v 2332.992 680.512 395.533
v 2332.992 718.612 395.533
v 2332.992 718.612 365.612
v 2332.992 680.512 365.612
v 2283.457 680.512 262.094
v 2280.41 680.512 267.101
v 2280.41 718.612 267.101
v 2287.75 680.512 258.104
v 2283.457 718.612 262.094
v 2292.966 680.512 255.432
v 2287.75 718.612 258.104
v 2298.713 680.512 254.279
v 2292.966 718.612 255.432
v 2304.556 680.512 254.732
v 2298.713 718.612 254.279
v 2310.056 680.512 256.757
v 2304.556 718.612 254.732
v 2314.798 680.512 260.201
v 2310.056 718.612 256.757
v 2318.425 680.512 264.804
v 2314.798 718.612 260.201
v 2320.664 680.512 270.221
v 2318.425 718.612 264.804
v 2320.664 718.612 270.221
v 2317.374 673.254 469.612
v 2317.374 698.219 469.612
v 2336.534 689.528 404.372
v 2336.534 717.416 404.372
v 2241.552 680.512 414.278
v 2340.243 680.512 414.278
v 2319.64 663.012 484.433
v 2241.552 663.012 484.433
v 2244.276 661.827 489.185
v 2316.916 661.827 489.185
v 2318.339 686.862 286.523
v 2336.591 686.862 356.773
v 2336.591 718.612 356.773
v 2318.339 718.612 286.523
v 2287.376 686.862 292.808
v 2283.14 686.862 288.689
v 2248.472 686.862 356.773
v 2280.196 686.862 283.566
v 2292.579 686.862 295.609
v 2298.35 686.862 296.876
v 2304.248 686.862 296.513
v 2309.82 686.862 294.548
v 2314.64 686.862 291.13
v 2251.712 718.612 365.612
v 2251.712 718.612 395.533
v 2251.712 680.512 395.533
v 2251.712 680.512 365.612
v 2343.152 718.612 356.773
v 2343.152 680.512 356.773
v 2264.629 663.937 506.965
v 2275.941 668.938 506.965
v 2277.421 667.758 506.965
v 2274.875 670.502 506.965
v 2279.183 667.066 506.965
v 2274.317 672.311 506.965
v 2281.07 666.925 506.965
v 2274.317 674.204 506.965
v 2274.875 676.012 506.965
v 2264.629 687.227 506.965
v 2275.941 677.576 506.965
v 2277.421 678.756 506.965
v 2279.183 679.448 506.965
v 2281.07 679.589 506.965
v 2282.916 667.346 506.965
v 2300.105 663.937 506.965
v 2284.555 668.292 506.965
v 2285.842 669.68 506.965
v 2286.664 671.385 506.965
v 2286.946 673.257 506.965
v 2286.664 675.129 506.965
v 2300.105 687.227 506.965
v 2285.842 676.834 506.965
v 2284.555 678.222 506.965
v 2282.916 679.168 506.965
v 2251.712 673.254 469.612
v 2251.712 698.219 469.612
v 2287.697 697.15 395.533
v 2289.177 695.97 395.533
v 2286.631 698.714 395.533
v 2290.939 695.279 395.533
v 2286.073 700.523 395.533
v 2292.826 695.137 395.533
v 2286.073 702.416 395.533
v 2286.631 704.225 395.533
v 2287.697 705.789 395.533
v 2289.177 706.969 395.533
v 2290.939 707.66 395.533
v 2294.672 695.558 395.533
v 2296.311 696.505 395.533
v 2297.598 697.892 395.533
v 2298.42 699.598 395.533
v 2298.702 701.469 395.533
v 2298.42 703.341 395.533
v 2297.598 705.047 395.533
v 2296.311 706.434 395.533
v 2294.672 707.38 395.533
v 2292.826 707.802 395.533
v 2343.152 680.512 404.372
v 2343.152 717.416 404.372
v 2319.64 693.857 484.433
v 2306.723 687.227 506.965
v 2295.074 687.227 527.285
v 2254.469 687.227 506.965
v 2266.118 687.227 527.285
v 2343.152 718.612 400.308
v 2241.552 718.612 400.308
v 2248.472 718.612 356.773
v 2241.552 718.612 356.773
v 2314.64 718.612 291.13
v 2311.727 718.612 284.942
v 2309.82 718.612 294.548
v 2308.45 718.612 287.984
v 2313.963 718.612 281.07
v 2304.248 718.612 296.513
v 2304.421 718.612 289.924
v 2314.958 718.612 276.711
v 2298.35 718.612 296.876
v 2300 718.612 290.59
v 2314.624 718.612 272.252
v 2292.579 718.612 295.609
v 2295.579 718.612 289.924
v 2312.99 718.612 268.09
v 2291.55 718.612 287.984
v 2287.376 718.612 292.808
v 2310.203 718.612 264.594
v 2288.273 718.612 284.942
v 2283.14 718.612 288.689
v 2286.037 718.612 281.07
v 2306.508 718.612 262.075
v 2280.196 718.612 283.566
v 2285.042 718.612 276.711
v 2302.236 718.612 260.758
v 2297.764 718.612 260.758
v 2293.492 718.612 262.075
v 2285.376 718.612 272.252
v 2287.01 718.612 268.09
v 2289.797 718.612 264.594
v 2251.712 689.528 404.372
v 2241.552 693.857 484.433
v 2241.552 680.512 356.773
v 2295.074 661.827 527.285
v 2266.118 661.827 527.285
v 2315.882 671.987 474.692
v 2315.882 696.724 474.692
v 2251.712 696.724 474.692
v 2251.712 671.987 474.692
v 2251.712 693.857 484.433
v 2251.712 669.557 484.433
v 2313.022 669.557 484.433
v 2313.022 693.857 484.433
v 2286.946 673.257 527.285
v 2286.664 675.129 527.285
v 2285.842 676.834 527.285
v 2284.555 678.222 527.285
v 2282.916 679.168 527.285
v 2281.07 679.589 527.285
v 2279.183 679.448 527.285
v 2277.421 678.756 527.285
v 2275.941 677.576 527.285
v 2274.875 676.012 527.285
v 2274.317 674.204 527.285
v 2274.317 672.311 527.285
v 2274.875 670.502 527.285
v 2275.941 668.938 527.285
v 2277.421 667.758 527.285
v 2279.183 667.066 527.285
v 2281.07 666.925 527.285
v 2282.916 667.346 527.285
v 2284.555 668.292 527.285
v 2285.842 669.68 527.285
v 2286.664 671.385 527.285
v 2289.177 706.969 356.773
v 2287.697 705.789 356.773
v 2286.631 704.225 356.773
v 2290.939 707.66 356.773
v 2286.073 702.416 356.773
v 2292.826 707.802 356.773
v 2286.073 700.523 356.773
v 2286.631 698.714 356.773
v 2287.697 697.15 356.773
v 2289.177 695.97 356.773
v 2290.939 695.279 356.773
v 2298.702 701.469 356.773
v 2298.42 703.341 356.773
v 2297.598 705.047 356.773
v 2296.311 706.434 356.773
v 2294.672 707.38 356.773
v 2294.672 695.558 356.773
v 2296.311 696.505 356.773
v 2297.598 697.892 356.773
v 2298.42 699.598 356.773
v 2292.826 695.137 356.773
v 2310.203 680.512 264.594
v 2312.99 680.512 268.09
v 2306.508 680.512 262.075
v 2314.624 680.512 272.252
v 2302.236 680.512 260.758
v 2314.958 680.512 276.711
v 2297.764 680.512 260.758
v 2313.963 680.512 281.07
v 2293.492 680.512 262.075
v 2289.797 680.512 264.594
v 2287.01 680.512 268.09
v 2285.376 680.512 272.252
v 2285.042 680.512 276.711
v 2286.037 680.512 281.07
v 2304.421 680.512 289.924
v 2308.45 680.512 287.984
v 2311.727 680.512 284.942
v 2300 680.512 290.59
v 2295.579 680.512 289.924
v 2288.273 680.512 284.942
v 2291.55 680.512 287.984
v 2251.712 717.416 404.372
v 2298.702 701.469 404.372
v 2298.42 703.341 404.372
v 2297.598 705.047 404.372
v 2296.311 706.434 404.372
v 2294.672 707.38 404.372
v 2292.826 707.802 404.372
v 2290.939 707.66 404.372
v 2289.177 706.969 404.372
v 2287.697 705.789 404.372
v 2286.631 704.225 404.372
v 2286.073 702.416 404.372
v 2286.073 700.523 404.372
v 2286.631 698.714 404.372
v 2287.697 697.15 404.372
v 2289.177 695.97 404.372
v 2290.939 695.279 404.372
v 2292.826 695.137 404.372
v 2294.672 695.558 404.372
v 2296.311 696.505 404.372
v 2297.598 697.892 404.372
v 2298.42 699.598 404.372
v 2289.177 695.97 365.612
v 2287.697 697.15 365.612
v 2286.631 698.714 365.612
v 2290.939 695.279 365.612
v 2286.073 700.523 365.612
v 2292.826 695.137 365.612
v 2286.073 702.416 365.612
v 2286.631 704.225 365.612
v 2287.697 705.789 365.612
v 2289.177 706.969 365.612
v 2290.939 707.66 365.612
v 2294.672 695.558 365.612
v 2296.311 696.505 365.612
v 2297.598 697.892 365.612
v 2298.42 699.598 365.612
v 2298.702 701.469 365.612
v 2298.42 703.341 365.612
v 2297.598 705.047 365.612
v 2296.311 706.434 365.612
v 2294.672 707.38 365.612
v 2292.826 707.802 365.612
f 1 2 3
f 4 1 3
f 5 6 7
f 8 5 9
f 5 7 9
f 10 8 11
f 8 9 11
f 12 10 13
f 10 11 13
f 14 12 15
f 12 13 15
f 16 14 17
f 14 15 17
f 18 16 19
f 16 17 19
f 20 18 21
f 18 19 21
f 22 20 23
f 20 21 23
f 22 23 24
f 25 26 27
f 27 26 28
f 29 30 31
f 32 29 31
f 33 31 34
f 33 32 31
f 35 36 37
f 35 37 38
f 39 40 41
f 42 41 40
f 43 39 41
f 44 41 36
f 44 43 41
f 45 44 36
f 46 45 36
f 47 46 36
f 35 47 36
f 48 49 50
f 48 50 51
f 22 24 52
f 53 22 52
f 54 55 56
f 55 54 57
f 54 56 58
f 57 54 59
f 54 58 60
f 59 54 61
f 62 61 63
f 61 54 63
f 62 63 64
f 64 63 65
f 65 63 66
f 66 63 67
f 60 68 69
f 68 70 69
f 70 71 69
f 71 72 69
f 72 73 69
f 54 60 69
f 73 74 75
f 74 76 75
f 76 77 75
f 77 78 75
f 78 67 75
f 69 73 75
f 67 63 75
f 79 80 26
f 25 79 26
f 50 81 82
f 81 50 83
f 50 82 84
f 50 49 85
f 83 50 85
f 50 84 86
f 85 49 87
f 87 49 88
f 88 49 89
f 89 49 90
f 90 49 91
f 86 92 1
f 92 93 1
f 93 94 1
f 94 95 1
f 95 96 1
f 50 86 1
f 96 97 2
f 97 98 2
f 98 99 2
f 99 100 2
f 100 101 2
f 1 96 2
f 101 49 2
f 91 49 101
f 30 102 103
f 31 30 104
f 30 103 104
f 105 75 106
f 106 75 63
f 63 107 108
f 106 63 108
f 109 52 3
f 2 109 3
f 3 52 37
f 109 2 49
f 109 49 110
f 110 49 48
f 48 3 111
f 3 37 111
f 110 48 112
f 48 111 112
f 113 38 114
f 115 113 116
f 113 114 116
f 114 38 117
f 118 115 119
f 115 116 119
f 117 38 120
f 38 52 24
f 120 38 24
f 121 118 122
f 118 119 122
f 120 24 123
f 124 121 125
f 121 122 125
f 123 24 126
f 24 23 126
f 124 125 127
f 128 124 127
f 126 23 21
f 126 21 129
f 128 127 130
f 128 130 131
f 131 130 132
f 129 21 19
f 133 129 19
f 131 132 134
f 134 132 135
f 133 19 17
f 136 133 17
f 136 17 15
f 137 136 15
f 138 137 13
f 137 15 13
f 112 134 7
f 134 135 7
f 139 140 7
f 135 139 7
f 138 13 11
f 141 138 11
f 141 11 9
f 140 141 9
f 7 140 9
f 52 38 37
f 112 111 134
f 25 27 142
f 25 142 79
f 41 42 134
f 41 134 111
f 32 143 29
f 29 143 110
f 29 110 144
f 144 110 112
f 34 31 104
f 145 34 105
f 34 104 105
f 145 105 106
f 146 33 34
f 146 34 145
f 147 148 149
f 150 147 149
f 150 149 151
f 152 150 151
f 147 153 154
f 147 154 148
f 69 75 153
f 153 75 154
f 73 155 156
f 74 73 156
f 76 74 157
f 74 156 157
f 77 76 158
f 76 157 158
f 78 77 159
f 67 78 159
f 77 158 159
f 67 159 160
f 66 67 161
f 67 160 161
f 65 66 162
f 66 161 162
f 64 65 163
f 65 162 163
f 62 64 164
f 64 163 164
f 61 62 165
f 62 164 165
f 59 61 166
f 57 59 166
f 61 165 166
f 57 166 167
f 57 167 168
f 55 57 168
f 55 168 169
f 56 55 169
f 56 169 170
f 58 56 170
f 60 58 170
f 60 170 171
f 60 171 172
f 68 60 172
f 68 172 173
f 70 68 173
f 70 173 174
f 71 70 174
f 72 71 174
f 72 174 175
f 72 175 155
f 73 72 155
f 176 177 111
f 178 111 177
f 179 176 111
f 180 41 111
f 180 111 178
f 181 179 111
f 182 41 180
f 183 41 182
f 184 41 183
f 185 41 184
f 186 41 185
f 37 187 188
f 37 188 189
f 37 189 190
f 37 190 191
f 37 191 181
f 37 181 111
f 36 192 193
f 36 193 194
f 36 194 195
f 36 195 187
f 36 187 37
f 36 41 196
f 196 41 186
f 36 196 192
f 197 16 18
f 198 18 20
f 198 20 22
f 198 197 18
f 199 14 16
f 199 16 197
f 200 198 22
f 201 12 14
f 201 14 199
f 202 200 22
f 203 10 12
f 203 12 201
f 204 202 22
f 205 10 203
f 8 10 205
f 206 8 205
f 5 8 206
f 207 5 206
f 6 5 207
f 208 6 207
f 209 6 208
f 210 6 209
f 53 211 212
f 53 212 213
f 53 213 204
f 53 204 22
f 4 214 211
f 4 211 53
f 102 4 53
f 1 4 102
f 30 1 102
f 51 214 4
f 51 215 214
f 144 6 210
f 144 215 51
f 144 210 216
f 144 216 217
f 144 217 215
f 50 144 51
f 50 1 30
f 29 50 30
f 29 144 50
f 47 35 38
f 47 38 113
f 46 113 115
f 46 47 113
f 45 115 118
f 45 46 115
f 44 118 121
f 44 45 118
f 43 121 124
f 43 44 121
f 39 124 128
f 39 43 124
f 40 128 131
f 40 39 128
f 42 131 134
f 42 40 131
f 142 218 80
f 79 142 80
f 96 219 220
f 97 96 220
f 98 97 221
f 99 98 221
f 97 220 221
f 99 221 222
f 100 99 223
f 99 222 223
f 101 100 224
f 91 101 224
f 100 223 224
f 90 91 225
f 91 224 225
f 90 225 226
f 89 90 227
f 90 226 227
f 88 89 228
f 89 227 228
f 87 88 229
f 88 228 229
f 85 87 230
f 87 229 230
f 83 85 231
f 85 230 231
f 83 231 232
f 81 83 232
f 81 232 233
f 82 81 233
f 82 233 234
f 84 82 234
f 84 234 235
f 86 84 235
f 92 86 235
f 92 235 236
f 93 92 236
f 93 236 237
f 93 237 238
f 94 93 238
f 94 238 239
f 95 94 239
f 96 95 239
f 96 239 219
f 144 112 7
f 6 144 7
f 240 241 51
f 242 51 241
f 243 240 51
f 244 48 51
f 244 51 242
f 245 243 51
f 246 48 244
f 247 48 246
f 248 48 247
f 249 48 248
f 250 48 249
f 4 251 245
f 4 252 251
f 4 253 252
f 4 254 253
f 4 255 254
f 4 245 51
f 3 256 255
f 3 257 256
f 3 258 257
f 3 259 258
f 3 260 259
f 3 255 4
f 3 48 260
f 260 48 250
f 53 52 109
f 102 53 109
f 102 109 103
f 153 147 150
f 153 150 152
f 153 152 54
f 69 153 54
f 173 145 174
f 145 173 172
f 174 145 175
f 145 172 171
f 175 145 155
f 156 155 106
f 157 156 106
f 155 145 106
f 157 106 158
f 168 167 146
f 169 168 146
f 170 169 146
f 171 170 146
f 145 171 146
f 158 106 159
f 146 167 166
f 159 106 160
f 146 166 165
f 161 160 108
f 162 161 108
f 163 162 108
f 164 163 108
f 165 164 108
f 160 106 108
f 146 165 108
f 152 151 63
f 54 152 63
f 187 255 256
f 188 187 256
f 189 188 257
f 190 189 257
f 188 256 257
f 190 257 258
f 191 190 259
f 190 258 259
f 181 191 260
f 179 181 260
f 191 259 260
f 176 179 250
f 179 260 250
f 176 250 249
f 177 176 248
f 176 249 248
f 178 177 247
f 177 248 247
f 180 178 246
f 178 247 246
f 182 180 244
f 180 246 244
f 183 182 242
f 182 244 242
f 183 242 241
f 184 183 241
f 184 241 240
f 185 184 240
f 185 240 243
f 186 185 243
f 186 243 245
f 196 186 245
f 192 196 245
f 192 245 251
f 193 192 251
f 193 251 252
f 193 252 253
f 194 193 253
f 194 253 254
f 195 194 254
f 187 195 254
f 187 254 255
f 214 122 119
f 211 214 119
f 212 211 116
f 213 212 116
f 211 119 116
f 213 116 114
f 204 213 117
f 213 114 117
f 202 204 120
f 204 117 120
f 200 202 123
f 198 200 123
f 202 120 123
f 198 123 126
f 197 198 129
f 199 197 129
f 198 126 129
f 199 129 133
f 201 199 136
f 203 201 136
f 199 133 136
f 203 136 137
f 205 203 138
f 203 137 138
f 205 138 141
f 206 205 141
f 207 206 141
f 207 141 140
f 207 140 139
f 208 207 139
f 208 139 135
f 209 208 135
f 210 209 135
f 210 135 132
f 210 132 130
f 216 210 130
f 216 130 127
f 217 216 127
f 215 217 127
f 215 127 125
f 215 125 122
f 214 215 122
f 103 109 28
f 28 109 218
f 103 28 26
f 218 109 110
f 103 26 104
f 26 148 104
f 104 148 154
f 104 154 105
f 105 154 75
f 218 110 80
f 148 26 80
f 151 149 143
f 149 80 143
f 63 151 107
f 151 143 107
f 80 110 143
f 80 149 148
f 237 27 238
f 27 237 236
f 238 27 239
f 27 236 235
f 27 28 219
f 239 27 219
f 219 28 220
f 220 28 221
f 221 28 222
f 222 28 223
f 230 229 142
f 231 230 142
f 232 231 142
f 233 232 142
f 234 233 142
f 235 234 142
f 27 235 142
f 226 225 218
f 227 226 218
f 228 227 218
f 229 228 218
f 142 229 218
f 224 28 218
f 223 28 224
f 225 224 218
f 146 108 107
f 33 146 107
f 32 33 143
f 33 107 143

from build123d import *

# Parameters (mm, degrees)
SKETCH1_R                      = 15
SKETCH1_W                      = 81.28
SKETCH1_H                      = 29.9212
BOSS_EXTRUDE1_DEPTH            = 88.9
CUT_EXTRUDE1_DEPTH             = 894.223960082
CUT_EXTRUDE1_DEPTH_BACK        = 894.223960082
CUT_EXTRUDE2_REACH             = 2404.418
CUT_EXTRUDE2_DIRECTION_2_DEPTH = 2403.418387278
CUT_EXTRUDE3_DEPTH             = 2403.418387278
CUT_EXTRUDE3_DEPTH_BACK        = 31.75
SKETCH6_R                      = 6.35
CUT_EXTRUDE4_DEPTH             = 31.75
SKETCH7_R                      = 6.35
CUT_EXTRUDE5_DEPTH             = 50.8


with BuildPart() as part:
    # Sketch1 → Boss-Extrude1 (new body)
    with BuildSketch(Plane(origin=(0, 718.612000035, 0), x_dir=(1, 0, 0), z_dir=(0, 1, 0))):
        with BuildLine():
            Line((2295.073740346, -527.28515435), (2266.117740346, -527.28515435))
            Line((2266.117740346, -527.28515435), (2241.551712769, -484.433115091))
            Line((2241.551712769, -484.433115091), (2241.551712769, -356.772715091))
            Line((2241.551712769, -356.772715091), (2280.410248463, -267.100940225))
            ThreePointArc((2280.410248463, -267.100940225), (2301.649946984, -254.303850194), (2320.663918503, -270.221111063))
            Line((2320.663918503, -270.221111063), (2343.151712769, -356.772715091))
            Line((2343.151712769, -356.772715091), (2343.151712769, -404.372315091))
            Line((2343.151712769, -404.372315091), (2319.639767922, -484.433115091))
            Line((2319.639767922, -484.433115091), (2295.073740346, -527.28515435))
        make_face()
        with Locations(Location((2299.99999994, -275.59, 0), (0, 0, 270))):
            Circle(SKETCH1_R, mode=Mode.SUBTRACT)
        with Locations((2292.351712769, -380.572515091)):
            Rectangle(SKETCH1_W, SKETCH1_H, mode=Mode.SUBTRACT)
    extrude(amount=-BOSS_EXTRUDE1_DEPTH)

    # Sketch3 → Cut-Extrude1 (cut, two sides: drawn at the far end of the back side and taken through both)
    with BuildSketch(Plane(origin=(2299.99999994, 0, 0), x_dir=(0, 0, -1), z_dir=(1, 0, 0)).offset(-CUT_EXTRUDE1_DEPTH_BACK)):
        Polygon((-254.240000028, 680.512000035), (-414.278315091, 680.512000035), (-489.18515435, 661.827103465), (-527.28515435, 661.827103465), (-527.28515435, 629.712000035), (-254.240000028, 629.712000035), align=None)
        Polygon((-527.28515435, 687.227103465), (-527.28515435, 718.612000035), (-400.308315091, 718.612000035), (-506.96515435, 687.227103465), align=None)
    extrude(amount=CUT_EXTRUDE1_DEPTH + CUT_EXTRUDE1_DEPTH_BACK, mode=Mode.SUBTRACT)

    # Cut-Extrude2: up to this plane
    cut_extrude2_end = Plane(origin=(2241.551712769, 686.673213286, 415.815179194), z_dir=(0, 0.9702698033545601, 0.24202584303810049))
    # Sketch4 → Cut-Extrude2 (cut, up to the surface)
    with BuildSketch(Plane(origin=(0, 718.612000035, 0), x_dir=(1, 0, 0), z_dir=(0, 1, 0)), mode=Mode.PRIVATE) as cut_extrude2_sk1:
        Polygon((2317.374261561, -469.611817535), (2336.533545297, -404.372315091), (2251.711712769, -404.372315091), (2251.711712769, -469.611817535), align=None)
    cut_extrude2_tool1 = split(extrude(cut_extrude2_sk1.sketch, amount=-CUT_EXTRUDE2_REACH, mode=Mode.PRIVATE), bisect_by=cut_extrude2_end, keep=Keep.BOTH, mode=Mode.PRIVATE)
    add(cut_extrude2_tool1.solids().sort_by_distance((2289.536084, 718.612, 435.607712))[0], mode=Mode.SUBTRACT)
    # Sketch4 → Cut-Extrude2 (cut, up to the surface)
    with BuildSketch(Plane(origin=(0, 718.612000035, 0), x_dir=(1, 0, 0), z_dir=(0, 1, 0)), mode=Mode.PRIVATE) as cut_extrude2_sk2:
        Polygon((2313.02160045, -484.433115091), (2315.882386888, -474.691817535), (2251.711712769, -474.691817535), (2251.711712769, -484.433115091), (2264.6287806, -506.96515435), (2300.104532619, -506.96515435), align=None)
    cut_extrude2_tool2 = split(extrude(cut_extrude2_sk2.sketch, amount=-CUT_EXTRUDE2_REACH, mode=Mode.PRIVATE), bisect_by=cut_extrude2_end, keep=Keep.BOTH, mode=Mode.PRIVATE)
    add(cut_extrude2_tool2.solids().sort_by_distance((2282.625495, 718.612, 489.24748))[0], mode=Mode.SUBTRACT)

    # Sketch4 → Cut-Extrude2 direction 2 (cut)
    with BuildSketch(Plane(origin=(0, 718.612000035, 0), x_dir=(1, 0, 0), z_dir=(0, 1, 0))):
        Polygon((2317.374261561, -469.611817535), (2336.533545297, -404.372315091), (2251.711712769, -404.372315091), (2251.711712769, -469.611817535), align=None)
        Polygon((2313.02160045, -484.433115091), (2315.882386888, -474.691817535), (2251.711712769, -474.691817535), (2251.711712769, -484.433115091), (2264.6287806, -506.96515435), (2300.104532619, -506.96515435), align=None)
    extrude(amount=CUT_EXTRUDE2_DIRECTION_2_DEPTH, mode=Mode.SUBTRACT)

    # Sketch5 → Cut-Extrude3 (cut, two sides: drawn at the far end of the back side and taken through both)
    with BuildSketch(Plane(origin=(0, 718.612000035, 0), x_dir=(1, 0, 0), z_dir=(0, 1, 0)).offset(-CUT_EXTRUDE3_DEPTH_BACK)):
        with BuildLine():
            Line((2336.590880718, -356.772715091), (2318.338523091, -286.522569115))
            ThreePointArc((2318.338523091, -286.522569115), (2298.350052896, -296.876149806), (2280.195820512, -283.566025074))
            Line((2280.195820512, -283.566025074), (2248.472295676, -356.772715091))
            Line((2248.472295676, -356.772715091), (2336.590880718, -356.772715091))
        make_face()
    extrude(amount=CUT_EXTRUDE3_DEPTH + CUT_EXTRUDE3_DEPTH_BACK, mode=Mode.SUBTRACT)

    # Sketch6 → Cut-Extrude4 (cut)
    with BuildSketch(Plane.XY.offset(527.28515435)):
        with Locations((2280.595740346, 673.257103465)):
            Circle(SKETCH6_R)
    extrude(amount=-CUT_EXTRUDE4_DEPTH, mode=Mode.SUBTRACT)

    # Sketch7 → Cut-Extrude5 (cut)
    with BuildSketch(Plane.XY.offset(404.372315091)):
        with Locations((2292.351712769, 701.469420385)):
            Circle(SKETCH7_R)
    extrude(amount=-CUT_EXTRUDE5_DEPTH, mode=Mode.SUBTRACT)


solid = part.part
